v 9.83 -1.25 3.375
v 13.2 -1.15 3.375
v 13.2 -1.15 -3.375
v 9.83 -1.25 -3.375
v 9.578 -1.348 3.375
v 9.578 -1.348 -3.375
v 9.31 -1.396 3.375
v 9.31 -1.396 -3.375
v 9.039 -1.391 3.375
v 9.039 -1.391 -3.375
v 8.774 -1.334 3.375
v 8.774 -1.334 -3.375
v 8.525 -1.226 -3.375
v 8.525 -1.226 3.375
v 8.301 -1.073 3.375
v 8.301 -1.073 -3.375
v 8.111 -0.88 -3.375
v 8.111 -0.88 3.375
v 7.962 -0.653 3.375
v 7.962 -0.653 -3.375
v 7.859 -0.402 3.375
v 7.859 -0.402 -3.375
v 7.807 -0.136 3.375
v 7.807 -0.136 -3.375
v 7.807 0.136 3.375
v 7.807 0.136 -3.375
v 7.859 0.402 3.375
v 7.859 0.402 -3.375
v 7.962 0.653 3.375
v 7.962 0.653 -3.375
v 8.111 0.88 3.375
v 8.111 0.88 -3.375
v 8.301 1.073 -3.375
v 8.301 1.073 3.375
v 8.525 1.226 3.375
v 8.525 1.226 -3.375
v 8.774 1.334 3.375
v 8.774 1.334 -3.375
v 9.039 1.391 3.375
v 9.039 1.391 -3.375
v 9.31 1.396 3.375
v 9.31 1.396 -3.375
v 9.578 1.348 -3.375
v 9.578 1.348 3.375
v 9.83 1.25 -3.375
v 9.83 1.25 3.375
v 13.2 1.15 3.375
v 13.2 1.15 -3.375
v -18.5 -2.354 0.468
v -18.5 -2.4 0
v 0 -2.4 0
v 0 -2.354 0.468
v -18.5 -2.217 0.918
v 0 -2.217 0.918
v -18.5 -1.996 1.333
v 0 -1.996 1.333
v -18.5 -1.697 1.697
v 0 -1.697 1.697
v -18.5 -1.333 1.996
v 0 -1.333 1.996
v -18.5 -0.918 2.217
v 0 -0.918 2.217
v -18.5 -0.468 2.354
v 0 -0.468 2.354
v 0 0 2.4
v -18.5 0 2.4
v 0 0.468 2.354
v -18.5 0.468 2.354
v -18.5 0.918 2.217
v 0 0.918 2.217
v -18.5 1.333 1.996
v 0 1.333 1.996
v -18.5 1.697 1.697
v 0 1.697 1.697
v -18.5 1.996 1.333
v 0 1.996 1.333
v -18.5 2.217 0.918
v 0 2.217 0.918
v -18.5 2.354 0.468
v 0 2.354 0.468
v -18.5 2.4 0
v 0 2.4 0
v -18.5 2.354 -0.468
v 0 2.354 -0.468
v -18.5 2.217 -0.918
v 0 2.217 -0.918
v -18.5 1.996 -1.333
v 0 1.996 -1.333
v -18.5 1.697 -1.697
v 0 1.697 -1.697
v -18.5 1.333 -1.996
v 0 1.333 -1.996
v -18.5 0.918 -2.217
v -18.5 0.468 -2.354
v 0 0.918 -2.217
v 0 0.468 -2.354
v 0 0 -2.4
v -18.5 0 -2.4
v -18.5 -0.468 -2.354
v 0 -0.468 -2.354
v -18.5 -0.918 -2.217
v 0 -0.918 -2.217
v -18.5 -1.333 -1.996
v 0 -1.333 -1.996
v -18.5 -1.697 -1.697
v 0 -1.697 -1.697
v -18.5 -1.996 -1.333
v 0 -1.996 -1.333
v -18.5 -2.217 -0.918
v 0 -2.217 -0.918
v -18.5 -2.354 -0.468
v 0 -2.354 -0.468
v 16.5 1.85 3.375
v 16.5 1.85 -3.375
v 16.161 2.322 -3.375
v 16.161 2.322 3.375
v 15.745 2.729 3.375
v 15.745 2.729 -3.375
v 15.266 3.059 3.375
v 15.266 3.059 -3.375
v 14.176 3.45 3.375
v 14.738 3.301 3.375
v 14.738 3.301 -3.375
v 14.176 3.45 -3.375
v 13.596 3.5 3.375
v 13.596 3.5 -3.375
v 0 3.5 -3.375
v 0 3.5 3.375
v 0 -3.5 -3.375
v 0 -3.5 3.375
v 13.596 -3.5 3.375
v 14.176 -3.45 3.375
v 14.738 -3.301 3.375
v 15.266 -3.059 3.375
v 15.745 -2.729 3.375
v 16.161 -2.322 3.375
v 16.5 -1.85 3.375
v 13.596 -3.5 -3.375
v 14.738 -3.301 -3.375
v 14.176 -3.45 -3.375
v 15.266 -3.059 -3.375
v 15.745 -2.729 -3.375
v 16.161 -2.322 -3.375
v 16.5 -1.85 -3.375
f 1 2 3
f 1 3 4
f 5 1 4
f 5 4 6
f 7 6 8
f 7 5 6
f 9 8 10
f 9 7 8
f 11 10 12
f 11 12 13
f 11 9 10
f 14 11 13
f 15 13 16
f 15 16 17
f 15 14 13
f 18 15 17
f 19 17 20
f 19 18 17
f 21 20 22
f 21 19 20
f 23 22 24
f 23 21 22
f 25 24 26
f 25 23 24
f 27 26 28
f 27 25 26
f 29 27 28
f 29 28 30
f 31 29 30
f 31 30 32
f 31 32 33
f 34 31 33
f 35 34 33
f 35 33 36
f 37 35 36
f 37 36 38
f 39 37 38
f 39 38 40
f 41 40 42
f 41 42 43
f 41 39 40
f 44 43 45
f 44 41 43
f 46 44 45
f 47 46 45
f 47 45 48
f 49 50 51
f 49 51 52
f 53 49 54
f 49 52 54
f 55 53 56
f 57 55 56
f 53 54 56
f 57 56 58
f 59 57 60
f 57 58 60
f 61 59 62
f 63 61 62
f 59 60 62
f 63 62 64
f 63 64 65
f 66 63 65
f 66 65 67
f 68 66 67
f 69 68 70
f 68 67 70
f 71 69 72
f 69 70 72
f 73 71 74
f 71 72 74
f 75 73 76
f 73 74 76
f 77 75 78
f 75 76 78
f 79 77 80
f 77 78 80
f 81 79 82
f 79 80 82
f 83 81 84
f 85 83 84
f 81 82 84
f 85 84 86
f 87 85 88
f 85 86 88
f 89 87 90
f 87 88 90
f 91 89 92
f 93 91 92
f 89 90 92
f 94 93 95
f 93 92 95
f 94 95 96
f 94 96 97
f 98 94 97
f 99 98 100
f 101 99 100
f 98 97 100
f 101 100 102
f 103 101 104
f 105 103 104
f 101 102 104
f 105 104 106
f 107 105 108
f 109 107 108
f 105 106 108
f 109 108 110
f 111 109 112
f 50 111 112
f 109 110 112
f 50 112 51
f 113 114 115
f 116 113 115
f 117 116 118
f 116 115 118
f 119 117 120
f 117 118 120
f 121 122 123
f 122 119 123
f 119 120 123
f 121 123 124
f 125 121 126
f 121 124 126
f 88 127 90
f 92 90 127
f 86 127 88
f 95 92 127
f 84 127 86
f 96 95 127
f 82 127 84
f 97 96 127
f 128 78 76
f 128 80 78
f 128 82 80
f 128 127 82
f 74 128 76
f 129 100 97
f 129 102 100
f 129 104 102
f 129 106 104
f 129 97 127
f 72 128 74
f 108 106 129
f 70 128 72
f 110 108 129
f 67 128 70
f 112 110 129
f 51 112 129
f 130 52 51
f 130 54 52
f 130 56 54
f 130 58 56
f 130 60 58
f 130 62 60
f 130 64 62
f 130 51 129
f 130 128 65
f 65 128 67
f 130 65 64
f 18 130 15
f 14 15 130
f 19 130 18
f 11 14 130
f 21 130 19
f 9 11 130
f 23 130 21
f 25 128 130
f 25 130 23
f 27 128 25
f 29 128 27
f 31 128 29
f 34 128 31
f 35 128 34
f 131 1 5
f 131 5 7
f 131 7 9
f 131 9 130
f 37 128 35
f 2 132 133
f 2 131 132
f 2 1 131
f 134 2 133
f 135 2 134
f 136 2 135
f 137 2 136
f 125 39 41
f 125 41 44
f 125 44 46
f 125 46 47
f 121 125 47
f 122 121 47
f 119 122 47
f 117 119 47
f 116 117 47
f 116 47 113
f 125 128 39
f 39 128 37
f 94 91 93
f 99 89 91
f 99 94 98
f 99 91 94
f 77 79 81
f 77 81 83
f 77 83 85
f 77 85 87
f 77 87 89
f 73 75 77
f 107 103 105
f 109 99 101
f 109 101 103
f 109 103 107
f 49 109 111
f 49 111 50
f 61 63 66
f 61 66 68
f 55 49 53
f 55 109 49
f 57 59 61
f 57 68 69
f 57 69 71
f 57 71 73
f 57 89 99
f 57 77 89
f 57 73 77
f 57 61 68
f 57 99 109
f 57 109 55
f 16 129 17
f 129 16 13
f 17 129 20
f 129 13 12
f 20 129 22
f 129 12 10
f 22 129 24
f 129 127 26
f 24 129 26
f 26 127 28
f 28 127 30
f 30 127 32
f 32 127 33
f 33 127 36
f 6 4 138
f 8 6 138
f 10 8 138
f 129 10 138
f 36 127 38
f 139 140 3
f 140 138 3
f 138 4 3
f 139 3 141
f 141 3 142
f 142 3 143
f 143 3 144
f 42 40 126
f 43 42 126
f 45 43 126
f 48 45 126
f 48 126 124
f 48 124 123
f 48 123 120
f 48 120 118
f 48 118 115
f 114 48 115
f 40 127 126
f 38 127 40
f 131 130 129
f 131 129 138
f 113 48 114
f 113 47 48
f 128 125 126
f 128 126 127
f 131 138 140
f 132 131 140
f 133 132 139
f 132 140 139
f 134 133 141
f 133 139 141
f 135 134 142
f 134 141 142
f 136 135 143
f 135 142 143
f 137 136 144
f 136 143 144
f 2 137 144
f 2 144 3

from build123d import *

# Parameters (mm, degrees)
F1_DEPTH      = 3.375
F1_DEPTH_BACK = 3.375
F2_R          = 2.4
F3_DEPTH      = 18.5
F4_T1_DEPTH   = 21.2682356522


# Not quite as in the source:
# - a fillet or chamfer that OpenCascade refuses, or shapes differently, is made with other operations: its cross-section is extruded or revolved along the edge and cut away or added


with BuildPart() as f1:
    # F0 (on Top) → F1 (new body, two sides)
    with BuildSketch(Plane.XY) as f1_sk:
        with BuildLine():
            Line((16.5, 3.5), (0, 3.5))
            Line((0, 3.5), (0, 2.35))
            Line((0, 2.35), (0, -2.35))
            Line((0, -2.35), (0, -3.5))
            Line((0, -3.5), (16.5, -3.5))
            Line((16.5, -3.5), (16.5, -1.85))
            Line((16.5, -1.85), (13.2, -1.15))
            Line((13.2, -1.15), (9.8304760106, -1.25))
            ThreePointArc((9.8304760106, -1.25), (7.8, 0), (9.8304760106, 1.25))
            Line((9.8304760106, 1.25), (13.2, 1.15))
            Line((13.2, 1.15), (16.5, 1.85))
            Line((16.5, 1.85), (16.5, 3.5))
        make_face()
    extrude(amount=F1_DEPTH)
    extrude(f1_sk.sketch, amount=-F1_DEPTH_BACK)

    # F2 (on face) → F3 (join)
    with BuildSketch(Plane(origin=(0, 0, 0), x_dir=(0, -1, 0), z_dir=(-1, 0, 0))):
        Circle(F2_R)
    extrude(amount=F3_DEPTH)

    # F4: fillet of radius 3.3798989873 on 2 edges, made by hand

    # F4_s2 → F4_t1 (cut)
    with BuildSketch(Plane.XY.offset(-10.6341178261)):
        with BuildLine():
            ThreePointArc((13.5963528696, -3.5), (15.2662081521, -3.0586891941), (16.5, -1.85))
            Line((16.5, -1.85), (16.5, -3.5))
            Line((16.5, -3.5), (13.5963528696, -3.5))
        make_face()
        with BuildLine():
            ThreePointArc((16.5, 1.85), (15.2662081521, 3.0586891941), (13.5963528696, 3.5))
            Line((13.5963528696, 3.5), (16.5, 3.5))
            Line((16.5, 3.5), (16.5, 1.85))
        make_face()
    extrude(amount=F4_T1_DEPTH, mode=Mode.SUBTRACT)


solid = f1.part
